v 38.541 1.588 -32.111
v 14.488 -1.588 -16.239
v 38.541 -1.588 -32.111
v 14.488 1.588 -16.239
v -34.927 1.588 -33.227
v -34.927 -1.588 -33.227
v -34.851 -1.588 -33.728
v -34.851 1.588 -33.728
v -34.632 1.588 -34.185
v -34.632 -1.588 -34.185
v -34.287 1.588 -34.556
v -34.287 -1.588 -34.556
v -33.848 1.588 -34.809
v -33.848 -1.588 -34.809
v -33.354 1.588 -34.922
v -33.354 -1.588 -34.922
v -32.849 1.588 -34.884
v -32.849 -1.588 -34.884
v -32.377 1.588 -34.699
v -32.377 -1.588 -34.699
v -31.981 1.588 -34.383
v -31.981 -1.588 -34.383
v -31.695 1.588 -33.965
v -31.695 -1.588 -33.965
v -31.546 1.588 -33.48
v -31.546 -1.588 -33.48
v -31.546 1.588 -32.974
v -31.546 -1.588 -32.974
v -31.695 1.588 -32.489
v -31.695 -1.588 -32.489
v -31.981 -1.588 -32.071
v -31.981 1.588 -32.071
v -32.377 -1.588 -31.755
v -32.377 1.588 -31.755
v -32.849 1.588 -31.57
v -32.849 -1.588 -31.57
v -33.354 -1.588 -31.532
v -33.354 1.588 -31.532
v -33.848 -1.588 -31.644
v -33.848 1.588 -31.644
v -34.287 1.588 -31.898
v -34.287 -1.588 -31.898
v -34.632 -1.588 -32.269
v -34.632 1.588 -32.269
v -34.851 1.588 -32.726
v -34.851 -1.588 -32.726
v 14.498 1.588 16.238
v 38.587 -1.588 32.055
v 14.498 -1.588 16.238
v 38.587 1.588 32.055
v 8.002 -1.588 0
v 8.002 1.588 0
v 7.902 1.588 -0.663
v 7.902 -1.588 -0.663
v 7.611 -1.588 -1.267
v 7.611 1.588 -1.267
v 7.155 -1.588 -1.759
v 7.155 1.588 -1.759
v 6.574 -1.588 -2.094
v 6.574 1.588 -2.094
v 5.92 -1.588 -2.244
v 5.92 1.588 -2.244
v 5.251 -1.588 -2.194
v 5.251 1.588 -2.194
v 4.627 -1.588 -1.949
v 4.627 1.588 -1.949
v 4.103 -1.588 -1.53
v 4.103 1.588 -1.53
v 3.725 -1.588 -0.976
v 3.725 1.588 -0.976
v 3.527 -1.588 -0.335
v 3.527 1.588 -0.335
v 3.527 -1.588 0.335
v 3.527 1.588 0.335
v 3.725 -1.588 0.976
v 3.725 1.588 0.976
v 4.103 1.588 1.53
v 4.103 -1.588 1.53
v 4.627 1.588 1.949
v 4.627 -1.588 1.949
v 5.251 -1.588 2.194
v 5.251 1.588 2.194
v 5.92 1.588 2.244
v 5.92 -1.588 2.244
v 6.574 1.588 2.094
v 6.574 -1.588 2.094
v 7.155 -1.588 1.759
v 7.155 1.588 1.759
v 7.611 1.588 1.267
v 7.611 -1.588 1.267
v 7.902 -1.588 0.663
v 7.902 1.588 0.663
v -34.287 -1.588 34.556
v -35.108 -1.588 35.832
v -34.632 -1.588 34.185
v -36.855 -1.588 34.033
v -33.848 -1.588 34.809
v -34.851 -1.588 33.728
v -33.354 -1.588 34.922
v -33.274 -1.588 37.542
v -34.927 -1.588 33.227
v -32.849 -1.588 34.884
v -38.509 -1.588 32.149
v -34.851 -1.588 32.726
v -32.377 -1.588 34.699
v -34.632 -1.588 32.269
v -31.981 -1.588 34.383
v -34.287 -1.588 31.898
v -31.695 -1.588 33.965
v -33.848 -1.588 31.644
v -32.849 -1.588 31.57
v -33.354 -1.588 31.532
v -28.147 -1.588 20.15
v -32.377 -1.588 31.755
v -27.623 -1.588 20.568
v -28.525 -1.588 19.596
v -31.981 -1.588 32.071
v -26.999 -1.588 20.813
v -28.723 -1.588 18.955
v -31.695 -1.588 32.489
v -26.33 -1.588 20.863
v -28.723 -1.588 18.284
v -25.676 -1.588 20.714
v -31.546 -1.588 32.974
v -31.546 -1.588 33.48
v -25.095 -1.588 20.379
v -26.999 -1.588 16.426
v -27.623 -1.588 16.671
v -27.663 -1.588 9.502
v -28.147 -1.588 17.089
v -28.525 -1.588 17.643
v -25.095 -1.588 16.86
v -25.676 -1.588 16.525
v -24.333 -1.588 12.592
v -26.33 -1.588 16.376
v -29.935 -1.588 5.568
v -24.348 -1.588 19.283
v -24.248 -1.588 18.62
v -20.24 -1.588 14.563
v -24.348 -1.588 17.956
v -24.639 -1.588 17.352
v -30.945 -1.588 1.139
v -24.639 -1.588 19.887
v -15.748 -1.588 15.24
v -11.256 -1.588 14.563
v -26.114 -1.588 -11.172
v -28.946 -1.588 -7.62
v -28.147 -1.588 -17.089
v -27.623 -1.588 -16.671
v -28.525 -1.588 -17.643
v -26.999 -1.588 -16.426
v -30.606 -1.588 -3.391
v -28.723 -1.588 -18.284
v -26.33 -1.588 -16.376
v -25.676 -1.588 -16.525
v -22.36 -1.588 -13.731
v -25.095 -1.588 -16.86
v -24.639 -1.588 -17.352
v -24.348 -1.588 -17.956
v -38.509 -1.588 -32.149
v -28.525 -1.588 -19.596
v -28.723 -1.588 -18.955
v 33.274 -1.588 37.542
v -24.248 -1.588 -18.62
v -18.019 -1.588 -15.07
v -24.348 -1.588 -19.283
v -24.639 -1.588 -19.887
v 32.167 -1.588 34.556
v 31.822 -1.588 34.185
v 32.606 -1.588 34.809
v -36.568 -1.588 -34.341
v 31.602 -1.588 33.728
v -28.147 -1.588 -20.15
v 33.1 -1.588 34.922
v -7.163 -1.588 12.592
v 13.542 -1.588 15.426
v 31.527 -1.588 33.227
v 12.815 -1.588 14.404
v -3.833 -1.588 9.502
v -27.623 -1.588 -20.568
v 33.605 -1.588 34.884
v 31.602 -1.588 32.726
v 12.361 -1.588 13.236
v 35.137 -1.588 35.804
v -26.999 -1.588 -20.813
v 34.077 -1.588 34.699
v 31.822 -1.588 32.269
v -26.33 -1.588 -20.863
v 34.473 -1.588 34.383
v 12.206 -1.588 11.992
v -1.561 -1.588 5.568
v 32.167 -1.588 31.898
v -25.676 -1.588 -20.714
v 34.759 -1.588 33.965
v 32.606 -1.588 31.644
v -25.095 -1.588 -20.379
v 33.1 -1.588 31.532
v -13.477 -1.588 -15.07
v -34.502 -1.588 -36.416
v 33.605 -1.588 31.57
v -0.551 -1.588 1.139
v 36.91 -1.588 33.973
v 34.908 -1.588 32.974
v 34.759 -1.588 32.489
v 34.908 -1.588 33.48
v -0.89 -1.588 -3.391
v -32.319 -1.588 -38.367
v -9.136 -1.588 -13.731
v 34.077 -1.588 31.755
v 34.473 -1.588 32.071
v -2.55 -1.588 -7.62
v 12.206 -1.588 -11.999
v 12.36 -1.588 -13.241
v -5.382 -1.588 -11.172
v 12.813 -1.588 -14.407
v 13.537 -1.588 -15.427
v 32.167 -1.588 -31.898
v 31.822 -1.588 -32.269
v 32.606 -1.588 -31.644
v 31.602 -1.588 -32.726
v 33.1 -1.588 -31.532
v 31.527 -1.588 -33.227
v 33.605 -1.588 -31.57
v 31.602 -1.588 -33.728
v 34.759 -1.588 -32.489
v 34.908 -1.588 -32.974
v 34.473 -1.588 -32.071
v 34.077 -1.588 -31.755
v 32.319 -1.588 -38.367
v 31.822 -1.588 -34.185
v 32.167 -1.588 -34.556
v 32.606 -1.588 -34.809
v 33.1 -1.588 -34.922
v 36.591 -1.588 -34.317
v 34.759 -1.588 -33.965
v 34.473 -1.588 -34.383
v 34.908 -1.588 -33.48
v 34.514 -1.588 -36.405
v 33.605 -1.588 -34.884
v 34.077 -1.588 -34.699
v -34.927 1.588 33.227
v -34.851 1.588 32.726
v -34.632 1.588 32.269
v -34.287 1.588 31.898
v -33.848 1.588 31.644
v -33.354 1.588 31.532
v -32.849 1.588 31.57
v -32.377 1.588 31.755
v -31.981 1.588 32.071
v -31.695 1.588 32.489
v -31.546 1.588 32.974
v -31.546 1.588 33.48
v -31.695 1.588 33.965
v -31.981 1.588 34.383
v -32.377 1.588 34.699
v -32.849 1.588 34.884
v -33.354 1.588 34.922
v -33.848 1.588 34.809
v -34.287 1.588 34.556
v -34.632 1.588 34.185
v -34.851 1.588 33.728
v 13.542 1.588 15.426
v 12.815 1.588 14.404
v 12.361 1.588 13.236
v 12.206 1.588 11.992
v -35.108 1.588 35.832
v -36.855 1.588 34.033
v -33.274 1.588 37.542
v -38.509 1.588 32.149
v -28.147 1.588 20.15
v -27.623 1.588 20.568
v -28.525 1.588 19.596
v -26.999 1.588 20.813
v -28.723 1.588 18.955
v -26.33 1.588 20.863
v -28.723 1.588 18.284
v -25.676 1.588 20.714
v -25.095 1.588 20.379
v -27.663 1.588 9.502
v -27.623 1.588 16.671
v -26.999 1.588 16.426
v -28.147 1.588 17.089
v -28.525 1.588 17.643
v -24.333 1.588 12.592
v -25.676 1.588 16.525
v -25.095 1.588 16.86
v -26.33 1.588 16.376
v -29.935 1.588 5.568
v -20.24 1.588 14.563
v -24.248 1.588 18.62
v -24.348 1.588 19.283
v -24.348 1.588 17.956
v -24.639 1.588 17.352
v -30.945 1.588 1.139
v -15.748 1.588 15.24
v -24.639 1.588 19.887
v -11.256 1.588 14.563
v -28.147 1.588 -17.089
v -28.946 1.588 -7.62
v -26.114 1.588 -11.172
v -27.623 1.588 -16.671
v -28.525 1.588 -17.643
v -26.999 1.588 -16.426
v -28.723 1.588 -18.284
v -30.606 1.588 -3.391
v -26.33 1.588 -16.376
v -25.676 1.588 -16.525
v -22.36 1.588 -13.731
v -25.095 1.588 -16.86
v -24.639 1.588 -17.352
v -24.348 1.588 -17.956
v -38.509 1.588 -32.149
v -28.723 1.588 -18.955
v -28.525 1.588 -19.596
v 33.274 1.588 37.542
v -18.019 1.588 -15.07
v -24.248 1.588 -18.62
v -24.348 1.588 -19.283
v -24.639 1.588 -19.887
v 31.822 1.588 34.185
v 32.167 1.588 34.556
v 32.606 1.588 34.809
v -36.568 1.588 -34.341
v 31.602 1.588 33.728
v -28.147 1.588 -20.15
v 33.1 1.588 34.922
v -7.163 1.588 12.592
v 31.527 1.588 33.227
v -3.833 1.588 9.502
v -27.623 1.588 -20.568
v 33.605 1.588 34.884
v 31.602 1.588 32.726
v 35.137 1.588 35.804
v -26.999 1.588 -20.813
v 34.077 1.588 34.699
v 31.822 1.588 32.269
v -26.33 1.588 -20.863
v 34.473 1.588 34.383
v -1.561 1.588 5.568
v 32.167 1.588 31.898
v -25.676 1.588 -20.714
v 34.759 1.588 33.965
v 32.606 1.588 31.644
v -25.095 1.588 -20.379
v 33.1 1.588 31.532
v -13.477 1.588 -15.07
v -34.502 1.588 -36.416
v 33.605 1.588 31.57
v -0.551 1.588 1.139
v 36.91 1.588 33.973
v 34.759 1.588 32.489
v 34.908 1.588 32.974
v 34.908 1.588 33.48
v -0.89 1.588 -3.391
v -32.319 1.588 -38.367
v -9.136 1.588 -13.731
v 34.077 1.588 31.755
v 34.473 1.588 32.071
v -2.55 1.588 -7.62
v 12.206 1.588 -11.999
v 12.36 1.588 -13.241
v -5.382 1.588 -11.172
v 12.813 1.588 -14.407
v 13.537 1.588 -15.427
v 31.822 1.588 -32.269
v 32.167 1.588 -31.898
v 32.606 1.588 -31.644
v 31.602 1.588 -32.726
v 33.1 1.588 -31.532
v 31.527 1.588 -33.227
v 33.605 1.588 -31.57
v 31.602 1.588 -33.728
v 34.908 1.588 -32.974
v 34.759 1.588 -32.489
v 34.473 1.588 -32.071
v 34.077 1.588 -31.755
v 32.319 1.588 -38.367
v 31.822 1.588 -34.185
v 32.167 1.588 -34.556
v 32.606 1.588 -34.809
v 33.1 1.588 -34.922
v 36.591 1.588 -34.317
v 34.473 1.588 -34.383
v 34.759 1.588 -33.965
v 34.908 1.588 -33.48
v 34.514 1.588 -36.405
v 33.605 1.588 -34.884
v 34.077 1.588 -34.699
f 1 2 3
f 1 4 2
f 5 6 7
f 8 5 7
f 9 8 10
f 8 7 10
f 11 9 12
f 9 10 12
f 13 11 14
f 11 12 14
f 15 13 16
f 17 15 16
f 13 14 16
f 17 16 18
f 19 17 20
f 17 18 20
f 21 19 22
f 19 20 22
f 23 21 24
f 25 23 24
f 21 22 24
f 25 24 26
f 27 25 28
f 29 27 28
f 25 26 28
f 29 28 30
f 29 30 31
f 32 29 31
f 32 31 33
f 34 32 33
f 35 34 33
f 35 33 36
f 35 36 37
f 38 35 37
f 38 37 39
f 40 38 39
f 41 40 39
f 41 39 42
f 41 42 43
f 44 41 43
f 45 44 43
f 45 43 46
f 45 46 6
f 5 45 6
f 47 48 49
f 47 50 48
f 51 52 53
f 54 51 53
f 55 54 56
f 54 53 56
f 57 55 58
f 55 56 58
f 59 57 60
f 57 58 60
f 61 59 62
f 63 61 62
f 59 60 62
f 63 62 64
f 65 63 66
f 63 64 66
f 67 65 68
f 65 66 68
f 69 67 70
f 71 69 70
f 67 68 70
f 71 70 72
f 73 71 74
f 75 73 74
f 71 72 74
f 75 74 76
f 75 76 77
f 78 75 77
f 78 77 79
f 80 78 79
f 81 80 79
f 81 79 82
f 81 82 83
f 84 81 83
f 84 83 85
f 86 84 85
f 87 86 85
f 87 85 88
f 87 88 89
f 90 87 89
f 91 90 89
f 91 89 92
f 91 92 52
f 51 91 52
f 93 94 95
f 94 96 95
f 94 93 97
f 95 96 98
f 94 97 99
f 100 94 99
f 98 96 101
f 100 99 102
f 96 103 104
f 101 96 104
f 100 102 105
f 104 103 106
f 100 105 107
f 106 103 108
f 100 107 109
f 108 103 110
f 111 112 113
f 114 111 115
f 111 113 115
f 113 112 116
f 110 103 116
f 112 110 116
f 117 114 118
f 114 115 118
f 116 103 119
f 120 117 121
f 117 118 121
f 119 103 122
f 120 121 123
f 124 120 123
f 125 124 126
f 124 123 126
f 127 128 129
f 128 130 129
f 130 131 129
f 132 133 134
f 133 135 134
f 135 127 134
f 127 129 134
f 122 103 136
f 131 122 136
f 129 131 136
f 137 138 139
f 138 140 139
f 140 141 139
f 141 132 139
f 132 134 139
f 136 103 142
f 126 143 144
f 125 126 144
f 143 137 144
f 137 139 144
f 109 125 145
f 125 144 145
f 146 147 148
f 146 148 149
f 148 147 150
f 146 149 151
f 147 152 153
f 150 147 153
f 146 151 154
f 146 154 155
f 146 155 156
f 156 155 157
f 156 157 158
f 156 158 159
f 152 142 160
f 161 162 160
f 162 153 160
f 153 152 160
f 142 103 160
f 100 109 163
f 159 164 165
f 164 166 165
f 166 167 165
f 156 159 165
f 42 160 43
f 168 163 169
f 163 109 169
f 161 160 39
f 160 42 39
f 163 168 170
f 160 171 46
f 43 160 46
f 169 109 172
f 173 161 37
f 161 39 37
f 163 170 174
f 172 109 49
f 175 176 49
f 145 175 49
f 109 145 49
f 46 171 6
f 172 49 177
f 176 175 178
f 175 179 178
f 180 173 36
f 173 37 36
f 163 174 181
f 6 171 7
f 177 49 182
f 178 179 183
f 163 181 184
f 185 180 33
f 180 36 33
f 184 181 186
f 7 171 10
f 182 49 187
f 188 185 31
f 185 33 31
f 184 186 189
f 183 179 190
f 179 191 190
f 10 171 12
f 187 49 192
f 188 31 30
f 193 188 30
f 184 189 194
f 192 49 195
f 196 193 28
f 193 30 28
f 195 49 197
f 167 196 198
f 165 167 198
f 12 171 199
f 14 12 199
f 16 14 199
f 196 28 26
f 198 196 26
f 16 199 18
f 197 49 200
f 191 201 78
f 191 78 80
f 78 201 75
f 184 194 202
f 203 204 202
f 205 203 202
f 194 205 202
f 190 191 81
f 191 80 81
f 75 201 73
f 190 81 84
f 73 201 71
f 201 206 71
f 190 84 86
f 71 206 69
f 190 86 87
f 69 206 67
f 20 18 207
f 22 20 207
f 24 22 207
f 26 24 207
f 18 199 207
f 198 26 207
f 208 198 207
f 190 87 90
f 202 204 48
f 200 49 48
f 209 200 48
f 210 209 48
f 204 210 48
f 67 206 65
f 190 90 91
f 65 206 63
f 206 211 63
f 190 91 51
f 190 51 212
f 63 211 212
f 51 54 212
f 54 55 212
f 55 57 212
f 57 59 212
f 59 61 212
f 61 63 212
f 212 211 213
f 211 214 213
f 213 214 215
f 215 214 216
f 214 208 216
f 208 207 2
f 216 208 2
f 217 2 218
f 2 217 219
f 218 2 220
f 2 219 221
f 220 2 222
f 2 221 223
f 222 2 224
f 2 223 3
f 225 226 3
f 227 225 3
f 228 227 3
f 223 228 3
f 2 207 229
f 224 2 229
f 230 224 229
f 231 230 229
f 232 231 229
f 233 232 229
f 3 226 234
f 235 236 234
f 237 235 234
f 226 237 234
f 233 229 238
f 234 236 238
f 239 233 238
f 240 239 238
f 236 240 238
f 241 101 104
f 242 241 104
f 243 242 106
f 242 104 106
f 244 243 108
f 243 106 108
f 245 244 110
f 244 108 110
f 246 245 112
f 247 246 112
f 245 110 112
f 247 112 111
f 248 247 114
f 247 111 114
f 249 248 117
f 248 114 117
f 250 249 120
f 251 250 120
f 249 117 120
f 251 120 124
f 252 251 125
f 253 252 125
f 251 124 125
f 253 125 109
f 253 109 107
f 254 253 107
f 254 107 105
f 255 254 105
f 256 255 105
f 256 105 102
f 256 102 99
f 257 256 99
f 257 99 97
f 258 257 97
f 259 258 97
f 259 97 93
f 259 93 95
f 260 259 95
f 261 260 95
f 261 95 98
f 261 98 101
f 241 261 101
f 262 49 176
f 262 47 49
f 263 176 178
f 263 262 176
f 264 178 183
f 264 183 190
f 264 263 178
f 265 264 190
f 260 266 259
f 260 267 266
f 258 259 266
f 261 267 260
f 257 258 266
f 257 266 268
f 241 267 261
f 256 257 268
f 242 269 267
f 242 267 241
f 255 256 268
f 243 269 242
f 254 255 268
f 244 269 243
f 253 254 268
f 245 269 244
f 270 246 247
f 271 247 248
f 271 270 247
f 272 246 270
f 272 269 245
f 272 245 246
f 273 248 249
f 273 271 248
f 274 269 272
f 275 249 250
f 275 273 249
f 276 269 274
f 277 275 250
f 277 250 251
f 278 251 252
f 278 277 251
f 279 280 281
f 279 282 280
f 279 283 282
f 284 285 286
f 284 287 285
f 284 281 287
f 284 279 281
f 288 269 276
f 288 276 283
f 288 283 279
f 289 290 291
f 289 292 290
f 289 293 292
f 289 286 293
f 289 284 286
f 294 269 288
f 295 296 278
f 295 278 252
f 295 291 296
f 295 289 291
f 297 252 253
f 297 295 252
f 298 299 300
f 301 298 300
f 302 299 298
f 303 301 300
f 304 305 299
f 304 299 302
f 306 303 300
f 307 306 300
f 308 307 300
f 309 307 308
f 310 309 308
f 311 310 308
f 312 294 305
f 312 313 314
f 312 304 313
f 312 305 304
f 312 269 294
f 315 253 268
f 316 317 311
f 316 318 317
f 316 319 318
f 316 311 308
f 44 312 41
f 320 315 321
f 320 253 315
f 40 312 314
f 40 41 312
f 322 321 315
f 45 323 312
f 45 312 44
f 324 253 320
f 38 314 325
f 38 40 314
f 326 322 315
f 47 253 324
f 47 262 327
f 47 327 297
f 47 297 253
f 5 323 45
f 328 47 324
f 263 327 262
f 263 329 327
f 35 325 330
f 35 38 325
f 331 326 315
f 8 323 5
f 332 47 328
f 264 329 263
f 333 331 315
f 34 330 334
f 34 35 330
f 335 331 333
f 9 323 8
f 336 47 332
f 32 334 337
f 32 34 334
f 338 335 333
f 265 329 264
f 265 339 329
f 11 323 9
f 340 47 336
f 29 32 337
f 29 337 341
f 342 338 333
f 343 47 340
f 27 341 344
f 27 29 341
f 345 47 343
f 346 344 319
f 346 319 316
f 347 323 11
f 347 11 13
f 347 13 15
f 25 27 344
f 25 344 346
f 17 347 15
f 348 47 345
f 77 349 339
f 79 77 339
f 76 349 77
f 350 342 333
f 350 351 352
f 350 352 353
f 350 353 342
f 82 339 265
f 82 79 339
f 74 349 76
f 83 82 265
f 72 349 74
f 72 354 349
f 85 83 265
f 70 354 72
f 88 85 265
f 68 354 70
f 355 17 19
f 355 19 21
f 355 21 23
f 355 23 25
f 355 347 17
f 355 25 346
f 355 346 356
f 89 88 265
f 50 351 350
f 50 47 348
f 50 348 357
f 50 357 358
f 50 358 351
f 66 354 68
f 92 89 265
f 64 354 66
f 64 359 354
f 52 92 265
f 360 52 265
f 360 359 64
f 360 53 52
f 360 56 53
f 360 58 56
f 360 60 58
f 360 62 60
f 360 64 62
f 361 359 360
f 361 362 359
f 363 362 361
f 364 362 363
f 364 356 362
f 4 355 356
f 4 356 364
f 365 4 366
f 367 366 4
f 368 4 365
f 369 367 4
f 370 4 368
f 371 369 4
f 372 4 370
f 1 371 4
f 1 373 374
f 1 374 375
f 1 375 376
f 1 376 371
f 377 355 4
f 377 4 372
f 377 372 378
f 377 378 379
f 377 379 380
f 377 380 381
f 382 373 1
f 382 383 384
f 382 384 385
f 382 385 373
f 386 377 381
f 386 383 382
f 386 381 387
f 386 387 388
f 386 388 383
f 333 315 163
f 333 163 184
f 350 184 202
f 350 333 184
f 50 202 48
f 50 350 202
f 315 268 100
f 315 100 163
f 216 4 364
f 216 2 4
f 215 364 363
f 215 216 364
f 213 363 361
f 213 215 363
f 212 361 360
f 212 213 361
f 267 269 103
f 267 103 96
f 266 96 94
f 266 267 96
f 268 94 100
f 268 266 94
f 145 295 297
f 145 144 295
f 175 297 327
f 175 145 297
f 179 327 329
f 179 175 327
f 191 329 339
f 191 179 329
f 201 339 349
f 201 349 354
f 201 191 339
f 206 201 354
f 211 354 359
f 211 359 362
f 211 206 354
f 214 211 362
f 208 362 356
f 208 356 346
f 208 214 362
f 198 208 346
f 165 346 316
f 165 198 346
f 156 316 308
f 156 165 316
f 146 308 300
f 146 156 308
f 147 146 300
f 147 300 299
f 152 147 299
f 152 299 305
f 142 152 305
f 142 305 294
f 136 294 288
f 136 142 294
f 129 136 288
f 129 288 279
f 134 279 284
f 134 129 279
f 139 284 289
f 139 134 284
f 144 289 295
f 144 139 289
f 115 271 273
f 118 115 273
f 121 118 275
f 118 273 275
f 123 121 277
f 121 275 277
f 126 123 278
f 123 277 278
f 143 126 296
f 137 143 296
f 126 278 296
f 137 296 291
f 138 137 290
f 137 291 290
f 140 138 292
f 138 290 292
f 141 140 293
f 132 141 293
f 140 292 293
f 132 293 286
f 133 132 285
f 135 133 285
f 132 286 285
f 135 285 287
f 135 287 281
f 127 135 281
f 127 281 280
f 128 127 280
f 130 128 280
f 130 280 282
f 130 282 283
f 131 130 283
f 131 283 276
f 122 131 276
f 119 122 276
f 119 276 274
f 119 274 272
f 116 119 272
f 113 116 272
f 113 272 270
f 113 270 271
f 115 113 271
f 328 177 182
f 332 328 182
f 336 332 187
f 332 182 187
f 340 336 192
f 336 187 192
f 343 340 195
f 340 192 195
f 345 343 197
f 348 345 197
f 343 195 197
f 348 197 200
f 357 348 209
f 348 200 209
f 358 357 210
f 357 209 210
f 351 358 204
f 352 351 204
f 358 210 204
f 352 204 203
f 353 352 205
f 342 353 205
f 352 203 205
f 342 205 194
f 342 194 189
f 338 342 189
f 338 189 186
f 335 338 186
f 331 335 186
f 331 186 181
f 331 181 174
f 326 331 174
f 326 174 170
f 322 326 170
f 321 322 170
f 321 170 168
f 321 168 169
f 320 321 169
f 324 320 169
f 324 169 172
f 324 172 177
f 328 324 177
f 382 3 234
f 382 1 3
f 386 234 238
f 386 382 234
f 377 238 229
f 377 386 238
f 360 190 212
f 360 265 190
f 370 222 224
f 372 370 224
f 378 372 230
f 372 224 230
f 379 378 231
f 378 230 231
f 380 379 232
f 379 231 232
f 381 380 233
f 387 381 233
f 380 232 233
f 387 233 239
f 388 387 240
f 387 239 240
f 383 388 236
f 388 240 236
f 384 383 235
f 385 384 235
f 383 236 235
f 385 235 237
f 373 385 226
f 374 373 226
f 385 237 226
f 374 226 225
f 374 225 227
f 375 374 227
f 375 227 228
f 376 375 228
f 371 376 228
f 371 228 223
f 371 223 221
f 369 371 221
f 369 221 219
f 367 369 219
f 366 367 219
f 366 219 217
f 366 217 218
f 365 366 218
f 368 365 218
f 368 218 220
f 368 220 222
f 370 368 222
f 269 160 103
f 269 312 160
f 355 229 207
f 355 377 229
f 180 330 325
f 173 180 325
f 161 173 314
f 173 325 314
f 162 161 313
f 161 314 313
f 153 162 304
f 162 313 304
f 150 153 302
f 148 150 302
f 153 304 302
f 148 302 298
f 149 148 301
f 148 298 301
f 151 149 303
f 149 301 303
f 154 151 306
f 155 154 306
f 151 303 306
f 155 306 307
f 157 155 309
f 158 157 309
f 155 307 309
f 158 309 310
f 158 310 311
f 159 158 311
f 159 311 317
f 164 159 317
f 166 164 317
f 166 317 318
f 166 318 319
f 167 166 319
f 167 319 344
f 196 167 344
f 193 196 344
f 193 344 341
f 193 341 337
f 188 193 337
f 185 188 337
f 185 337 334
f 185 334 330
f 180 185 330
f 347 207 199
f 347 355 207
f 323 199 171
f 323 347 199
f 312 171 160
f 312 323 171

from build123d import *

# Parameters (mm, degrees)
SKETCH1_R            = 15.24
BOSS_EXTRUDE1_DEPTH  = 1.5875
M3_CLEARANCE_HOLE1_D = 3.4
FILLET1_R            = 5.08
M4_CLEARANCE_HOLE2_D = 4.5
CIRPATTERN1_COUNT    = 3


with BuildPart() as part:
    # Sketch1 → Boss-Extrude1 (new, symmetric)
    with BuildSketch(Plane(origin=(0, 0, 0), x_dir=(1, 0, 0), z_dir=(0, 1, 0))):
        with BuildLine():
            Line((-38.50947489, 32.14883464), (-38.50947489, -32.14883464))
            ThreePointArc((-38.50947489, -32.14883464), (-35.992876625, -34.943383598), (-33.274, -37.541552299))
            Line((-33.274, -37.541552299), (33.274, -37.541552299))
            ThreePointArc((33.274, -37.541552299), (36.035191498, -34.899744966), (38.587271968, -32.055415565))
            Line((38.587271968, -32.055415565), (12.205850338, -14.733372241))
            Line((12.205850338, -14.733372241), (12.205850338, 14.733372241))
            Line((12.205850338, 14.733372241), (38.541369471, 32.110591154))
            ThreePointArc((38.541369471, 32.110591154), (35.567819018, 35.375944868), (32.318597457, 38.367114609))
            Line((32.318597457, 38.367114609), (-32.318597457, 38.367114609))
            ThreePointArc((-32.318597457, 38.367114609), (-35.55025611, 35.393594272), (-38.50947489, 32.14883464))
        make_face()
        with Locations((-15.748, 0)):
            Circle(SKETCH1_R, mode=Mode.SUBTRACT)
    extrude(amount=BOSS_EXTRUDE1_DEPTH, both=True)

    # M3 Clearance Hole1 (through all)
    with Locations(Plane(origin=(0, 1.5875, 0), x_dir=(1, 0, 0), z_dir=(0, 1, 0))):
        with Locations((-33.226947648, 33.226947648), (33.226947648, 33.226947648), (33.226947648, -33.226947648), (-33.226947648, -33.226947648)):
            Hole(M3_CLEARANCE_HOLE1_D / 2)

    # Fillet1
    fillet1_edges = [part.edges().sort_by_distance(p)[0] for p in [
        (12.205850338, 0, -14.733372241),
        (12.205850338, 0, 14.733372241),
    ]]
    fillet(fillet1_edges, radius=FILLET1_R)

    # M4 Clearance Hole2 (through all)
    with Locations(Plane(origin=(0, -1.5875, 0), x_dir=(-1, 0, 0), z_dir=(0, -1, 0))):
        with Locations((-5.752, 0)):
            m4_clearance_hole2 = Hole(M4_CLEARANCE_HOLE2_D / 2)

    # CirPattern1: M4 Clearance Hole2 ×3 about axis
    cirpattern1_axis = Axis((-15.748, 0, 0), (0, -1, 0))
    for i in range(1, CIRPATTERN1_COUNT):
        add(m4_clearance_hole2.rotate(cirpattern1_axis, i * 360 / CIRPATTERN1_COUNT), mode=Mode.SUBTRACT)


solid = part.part
